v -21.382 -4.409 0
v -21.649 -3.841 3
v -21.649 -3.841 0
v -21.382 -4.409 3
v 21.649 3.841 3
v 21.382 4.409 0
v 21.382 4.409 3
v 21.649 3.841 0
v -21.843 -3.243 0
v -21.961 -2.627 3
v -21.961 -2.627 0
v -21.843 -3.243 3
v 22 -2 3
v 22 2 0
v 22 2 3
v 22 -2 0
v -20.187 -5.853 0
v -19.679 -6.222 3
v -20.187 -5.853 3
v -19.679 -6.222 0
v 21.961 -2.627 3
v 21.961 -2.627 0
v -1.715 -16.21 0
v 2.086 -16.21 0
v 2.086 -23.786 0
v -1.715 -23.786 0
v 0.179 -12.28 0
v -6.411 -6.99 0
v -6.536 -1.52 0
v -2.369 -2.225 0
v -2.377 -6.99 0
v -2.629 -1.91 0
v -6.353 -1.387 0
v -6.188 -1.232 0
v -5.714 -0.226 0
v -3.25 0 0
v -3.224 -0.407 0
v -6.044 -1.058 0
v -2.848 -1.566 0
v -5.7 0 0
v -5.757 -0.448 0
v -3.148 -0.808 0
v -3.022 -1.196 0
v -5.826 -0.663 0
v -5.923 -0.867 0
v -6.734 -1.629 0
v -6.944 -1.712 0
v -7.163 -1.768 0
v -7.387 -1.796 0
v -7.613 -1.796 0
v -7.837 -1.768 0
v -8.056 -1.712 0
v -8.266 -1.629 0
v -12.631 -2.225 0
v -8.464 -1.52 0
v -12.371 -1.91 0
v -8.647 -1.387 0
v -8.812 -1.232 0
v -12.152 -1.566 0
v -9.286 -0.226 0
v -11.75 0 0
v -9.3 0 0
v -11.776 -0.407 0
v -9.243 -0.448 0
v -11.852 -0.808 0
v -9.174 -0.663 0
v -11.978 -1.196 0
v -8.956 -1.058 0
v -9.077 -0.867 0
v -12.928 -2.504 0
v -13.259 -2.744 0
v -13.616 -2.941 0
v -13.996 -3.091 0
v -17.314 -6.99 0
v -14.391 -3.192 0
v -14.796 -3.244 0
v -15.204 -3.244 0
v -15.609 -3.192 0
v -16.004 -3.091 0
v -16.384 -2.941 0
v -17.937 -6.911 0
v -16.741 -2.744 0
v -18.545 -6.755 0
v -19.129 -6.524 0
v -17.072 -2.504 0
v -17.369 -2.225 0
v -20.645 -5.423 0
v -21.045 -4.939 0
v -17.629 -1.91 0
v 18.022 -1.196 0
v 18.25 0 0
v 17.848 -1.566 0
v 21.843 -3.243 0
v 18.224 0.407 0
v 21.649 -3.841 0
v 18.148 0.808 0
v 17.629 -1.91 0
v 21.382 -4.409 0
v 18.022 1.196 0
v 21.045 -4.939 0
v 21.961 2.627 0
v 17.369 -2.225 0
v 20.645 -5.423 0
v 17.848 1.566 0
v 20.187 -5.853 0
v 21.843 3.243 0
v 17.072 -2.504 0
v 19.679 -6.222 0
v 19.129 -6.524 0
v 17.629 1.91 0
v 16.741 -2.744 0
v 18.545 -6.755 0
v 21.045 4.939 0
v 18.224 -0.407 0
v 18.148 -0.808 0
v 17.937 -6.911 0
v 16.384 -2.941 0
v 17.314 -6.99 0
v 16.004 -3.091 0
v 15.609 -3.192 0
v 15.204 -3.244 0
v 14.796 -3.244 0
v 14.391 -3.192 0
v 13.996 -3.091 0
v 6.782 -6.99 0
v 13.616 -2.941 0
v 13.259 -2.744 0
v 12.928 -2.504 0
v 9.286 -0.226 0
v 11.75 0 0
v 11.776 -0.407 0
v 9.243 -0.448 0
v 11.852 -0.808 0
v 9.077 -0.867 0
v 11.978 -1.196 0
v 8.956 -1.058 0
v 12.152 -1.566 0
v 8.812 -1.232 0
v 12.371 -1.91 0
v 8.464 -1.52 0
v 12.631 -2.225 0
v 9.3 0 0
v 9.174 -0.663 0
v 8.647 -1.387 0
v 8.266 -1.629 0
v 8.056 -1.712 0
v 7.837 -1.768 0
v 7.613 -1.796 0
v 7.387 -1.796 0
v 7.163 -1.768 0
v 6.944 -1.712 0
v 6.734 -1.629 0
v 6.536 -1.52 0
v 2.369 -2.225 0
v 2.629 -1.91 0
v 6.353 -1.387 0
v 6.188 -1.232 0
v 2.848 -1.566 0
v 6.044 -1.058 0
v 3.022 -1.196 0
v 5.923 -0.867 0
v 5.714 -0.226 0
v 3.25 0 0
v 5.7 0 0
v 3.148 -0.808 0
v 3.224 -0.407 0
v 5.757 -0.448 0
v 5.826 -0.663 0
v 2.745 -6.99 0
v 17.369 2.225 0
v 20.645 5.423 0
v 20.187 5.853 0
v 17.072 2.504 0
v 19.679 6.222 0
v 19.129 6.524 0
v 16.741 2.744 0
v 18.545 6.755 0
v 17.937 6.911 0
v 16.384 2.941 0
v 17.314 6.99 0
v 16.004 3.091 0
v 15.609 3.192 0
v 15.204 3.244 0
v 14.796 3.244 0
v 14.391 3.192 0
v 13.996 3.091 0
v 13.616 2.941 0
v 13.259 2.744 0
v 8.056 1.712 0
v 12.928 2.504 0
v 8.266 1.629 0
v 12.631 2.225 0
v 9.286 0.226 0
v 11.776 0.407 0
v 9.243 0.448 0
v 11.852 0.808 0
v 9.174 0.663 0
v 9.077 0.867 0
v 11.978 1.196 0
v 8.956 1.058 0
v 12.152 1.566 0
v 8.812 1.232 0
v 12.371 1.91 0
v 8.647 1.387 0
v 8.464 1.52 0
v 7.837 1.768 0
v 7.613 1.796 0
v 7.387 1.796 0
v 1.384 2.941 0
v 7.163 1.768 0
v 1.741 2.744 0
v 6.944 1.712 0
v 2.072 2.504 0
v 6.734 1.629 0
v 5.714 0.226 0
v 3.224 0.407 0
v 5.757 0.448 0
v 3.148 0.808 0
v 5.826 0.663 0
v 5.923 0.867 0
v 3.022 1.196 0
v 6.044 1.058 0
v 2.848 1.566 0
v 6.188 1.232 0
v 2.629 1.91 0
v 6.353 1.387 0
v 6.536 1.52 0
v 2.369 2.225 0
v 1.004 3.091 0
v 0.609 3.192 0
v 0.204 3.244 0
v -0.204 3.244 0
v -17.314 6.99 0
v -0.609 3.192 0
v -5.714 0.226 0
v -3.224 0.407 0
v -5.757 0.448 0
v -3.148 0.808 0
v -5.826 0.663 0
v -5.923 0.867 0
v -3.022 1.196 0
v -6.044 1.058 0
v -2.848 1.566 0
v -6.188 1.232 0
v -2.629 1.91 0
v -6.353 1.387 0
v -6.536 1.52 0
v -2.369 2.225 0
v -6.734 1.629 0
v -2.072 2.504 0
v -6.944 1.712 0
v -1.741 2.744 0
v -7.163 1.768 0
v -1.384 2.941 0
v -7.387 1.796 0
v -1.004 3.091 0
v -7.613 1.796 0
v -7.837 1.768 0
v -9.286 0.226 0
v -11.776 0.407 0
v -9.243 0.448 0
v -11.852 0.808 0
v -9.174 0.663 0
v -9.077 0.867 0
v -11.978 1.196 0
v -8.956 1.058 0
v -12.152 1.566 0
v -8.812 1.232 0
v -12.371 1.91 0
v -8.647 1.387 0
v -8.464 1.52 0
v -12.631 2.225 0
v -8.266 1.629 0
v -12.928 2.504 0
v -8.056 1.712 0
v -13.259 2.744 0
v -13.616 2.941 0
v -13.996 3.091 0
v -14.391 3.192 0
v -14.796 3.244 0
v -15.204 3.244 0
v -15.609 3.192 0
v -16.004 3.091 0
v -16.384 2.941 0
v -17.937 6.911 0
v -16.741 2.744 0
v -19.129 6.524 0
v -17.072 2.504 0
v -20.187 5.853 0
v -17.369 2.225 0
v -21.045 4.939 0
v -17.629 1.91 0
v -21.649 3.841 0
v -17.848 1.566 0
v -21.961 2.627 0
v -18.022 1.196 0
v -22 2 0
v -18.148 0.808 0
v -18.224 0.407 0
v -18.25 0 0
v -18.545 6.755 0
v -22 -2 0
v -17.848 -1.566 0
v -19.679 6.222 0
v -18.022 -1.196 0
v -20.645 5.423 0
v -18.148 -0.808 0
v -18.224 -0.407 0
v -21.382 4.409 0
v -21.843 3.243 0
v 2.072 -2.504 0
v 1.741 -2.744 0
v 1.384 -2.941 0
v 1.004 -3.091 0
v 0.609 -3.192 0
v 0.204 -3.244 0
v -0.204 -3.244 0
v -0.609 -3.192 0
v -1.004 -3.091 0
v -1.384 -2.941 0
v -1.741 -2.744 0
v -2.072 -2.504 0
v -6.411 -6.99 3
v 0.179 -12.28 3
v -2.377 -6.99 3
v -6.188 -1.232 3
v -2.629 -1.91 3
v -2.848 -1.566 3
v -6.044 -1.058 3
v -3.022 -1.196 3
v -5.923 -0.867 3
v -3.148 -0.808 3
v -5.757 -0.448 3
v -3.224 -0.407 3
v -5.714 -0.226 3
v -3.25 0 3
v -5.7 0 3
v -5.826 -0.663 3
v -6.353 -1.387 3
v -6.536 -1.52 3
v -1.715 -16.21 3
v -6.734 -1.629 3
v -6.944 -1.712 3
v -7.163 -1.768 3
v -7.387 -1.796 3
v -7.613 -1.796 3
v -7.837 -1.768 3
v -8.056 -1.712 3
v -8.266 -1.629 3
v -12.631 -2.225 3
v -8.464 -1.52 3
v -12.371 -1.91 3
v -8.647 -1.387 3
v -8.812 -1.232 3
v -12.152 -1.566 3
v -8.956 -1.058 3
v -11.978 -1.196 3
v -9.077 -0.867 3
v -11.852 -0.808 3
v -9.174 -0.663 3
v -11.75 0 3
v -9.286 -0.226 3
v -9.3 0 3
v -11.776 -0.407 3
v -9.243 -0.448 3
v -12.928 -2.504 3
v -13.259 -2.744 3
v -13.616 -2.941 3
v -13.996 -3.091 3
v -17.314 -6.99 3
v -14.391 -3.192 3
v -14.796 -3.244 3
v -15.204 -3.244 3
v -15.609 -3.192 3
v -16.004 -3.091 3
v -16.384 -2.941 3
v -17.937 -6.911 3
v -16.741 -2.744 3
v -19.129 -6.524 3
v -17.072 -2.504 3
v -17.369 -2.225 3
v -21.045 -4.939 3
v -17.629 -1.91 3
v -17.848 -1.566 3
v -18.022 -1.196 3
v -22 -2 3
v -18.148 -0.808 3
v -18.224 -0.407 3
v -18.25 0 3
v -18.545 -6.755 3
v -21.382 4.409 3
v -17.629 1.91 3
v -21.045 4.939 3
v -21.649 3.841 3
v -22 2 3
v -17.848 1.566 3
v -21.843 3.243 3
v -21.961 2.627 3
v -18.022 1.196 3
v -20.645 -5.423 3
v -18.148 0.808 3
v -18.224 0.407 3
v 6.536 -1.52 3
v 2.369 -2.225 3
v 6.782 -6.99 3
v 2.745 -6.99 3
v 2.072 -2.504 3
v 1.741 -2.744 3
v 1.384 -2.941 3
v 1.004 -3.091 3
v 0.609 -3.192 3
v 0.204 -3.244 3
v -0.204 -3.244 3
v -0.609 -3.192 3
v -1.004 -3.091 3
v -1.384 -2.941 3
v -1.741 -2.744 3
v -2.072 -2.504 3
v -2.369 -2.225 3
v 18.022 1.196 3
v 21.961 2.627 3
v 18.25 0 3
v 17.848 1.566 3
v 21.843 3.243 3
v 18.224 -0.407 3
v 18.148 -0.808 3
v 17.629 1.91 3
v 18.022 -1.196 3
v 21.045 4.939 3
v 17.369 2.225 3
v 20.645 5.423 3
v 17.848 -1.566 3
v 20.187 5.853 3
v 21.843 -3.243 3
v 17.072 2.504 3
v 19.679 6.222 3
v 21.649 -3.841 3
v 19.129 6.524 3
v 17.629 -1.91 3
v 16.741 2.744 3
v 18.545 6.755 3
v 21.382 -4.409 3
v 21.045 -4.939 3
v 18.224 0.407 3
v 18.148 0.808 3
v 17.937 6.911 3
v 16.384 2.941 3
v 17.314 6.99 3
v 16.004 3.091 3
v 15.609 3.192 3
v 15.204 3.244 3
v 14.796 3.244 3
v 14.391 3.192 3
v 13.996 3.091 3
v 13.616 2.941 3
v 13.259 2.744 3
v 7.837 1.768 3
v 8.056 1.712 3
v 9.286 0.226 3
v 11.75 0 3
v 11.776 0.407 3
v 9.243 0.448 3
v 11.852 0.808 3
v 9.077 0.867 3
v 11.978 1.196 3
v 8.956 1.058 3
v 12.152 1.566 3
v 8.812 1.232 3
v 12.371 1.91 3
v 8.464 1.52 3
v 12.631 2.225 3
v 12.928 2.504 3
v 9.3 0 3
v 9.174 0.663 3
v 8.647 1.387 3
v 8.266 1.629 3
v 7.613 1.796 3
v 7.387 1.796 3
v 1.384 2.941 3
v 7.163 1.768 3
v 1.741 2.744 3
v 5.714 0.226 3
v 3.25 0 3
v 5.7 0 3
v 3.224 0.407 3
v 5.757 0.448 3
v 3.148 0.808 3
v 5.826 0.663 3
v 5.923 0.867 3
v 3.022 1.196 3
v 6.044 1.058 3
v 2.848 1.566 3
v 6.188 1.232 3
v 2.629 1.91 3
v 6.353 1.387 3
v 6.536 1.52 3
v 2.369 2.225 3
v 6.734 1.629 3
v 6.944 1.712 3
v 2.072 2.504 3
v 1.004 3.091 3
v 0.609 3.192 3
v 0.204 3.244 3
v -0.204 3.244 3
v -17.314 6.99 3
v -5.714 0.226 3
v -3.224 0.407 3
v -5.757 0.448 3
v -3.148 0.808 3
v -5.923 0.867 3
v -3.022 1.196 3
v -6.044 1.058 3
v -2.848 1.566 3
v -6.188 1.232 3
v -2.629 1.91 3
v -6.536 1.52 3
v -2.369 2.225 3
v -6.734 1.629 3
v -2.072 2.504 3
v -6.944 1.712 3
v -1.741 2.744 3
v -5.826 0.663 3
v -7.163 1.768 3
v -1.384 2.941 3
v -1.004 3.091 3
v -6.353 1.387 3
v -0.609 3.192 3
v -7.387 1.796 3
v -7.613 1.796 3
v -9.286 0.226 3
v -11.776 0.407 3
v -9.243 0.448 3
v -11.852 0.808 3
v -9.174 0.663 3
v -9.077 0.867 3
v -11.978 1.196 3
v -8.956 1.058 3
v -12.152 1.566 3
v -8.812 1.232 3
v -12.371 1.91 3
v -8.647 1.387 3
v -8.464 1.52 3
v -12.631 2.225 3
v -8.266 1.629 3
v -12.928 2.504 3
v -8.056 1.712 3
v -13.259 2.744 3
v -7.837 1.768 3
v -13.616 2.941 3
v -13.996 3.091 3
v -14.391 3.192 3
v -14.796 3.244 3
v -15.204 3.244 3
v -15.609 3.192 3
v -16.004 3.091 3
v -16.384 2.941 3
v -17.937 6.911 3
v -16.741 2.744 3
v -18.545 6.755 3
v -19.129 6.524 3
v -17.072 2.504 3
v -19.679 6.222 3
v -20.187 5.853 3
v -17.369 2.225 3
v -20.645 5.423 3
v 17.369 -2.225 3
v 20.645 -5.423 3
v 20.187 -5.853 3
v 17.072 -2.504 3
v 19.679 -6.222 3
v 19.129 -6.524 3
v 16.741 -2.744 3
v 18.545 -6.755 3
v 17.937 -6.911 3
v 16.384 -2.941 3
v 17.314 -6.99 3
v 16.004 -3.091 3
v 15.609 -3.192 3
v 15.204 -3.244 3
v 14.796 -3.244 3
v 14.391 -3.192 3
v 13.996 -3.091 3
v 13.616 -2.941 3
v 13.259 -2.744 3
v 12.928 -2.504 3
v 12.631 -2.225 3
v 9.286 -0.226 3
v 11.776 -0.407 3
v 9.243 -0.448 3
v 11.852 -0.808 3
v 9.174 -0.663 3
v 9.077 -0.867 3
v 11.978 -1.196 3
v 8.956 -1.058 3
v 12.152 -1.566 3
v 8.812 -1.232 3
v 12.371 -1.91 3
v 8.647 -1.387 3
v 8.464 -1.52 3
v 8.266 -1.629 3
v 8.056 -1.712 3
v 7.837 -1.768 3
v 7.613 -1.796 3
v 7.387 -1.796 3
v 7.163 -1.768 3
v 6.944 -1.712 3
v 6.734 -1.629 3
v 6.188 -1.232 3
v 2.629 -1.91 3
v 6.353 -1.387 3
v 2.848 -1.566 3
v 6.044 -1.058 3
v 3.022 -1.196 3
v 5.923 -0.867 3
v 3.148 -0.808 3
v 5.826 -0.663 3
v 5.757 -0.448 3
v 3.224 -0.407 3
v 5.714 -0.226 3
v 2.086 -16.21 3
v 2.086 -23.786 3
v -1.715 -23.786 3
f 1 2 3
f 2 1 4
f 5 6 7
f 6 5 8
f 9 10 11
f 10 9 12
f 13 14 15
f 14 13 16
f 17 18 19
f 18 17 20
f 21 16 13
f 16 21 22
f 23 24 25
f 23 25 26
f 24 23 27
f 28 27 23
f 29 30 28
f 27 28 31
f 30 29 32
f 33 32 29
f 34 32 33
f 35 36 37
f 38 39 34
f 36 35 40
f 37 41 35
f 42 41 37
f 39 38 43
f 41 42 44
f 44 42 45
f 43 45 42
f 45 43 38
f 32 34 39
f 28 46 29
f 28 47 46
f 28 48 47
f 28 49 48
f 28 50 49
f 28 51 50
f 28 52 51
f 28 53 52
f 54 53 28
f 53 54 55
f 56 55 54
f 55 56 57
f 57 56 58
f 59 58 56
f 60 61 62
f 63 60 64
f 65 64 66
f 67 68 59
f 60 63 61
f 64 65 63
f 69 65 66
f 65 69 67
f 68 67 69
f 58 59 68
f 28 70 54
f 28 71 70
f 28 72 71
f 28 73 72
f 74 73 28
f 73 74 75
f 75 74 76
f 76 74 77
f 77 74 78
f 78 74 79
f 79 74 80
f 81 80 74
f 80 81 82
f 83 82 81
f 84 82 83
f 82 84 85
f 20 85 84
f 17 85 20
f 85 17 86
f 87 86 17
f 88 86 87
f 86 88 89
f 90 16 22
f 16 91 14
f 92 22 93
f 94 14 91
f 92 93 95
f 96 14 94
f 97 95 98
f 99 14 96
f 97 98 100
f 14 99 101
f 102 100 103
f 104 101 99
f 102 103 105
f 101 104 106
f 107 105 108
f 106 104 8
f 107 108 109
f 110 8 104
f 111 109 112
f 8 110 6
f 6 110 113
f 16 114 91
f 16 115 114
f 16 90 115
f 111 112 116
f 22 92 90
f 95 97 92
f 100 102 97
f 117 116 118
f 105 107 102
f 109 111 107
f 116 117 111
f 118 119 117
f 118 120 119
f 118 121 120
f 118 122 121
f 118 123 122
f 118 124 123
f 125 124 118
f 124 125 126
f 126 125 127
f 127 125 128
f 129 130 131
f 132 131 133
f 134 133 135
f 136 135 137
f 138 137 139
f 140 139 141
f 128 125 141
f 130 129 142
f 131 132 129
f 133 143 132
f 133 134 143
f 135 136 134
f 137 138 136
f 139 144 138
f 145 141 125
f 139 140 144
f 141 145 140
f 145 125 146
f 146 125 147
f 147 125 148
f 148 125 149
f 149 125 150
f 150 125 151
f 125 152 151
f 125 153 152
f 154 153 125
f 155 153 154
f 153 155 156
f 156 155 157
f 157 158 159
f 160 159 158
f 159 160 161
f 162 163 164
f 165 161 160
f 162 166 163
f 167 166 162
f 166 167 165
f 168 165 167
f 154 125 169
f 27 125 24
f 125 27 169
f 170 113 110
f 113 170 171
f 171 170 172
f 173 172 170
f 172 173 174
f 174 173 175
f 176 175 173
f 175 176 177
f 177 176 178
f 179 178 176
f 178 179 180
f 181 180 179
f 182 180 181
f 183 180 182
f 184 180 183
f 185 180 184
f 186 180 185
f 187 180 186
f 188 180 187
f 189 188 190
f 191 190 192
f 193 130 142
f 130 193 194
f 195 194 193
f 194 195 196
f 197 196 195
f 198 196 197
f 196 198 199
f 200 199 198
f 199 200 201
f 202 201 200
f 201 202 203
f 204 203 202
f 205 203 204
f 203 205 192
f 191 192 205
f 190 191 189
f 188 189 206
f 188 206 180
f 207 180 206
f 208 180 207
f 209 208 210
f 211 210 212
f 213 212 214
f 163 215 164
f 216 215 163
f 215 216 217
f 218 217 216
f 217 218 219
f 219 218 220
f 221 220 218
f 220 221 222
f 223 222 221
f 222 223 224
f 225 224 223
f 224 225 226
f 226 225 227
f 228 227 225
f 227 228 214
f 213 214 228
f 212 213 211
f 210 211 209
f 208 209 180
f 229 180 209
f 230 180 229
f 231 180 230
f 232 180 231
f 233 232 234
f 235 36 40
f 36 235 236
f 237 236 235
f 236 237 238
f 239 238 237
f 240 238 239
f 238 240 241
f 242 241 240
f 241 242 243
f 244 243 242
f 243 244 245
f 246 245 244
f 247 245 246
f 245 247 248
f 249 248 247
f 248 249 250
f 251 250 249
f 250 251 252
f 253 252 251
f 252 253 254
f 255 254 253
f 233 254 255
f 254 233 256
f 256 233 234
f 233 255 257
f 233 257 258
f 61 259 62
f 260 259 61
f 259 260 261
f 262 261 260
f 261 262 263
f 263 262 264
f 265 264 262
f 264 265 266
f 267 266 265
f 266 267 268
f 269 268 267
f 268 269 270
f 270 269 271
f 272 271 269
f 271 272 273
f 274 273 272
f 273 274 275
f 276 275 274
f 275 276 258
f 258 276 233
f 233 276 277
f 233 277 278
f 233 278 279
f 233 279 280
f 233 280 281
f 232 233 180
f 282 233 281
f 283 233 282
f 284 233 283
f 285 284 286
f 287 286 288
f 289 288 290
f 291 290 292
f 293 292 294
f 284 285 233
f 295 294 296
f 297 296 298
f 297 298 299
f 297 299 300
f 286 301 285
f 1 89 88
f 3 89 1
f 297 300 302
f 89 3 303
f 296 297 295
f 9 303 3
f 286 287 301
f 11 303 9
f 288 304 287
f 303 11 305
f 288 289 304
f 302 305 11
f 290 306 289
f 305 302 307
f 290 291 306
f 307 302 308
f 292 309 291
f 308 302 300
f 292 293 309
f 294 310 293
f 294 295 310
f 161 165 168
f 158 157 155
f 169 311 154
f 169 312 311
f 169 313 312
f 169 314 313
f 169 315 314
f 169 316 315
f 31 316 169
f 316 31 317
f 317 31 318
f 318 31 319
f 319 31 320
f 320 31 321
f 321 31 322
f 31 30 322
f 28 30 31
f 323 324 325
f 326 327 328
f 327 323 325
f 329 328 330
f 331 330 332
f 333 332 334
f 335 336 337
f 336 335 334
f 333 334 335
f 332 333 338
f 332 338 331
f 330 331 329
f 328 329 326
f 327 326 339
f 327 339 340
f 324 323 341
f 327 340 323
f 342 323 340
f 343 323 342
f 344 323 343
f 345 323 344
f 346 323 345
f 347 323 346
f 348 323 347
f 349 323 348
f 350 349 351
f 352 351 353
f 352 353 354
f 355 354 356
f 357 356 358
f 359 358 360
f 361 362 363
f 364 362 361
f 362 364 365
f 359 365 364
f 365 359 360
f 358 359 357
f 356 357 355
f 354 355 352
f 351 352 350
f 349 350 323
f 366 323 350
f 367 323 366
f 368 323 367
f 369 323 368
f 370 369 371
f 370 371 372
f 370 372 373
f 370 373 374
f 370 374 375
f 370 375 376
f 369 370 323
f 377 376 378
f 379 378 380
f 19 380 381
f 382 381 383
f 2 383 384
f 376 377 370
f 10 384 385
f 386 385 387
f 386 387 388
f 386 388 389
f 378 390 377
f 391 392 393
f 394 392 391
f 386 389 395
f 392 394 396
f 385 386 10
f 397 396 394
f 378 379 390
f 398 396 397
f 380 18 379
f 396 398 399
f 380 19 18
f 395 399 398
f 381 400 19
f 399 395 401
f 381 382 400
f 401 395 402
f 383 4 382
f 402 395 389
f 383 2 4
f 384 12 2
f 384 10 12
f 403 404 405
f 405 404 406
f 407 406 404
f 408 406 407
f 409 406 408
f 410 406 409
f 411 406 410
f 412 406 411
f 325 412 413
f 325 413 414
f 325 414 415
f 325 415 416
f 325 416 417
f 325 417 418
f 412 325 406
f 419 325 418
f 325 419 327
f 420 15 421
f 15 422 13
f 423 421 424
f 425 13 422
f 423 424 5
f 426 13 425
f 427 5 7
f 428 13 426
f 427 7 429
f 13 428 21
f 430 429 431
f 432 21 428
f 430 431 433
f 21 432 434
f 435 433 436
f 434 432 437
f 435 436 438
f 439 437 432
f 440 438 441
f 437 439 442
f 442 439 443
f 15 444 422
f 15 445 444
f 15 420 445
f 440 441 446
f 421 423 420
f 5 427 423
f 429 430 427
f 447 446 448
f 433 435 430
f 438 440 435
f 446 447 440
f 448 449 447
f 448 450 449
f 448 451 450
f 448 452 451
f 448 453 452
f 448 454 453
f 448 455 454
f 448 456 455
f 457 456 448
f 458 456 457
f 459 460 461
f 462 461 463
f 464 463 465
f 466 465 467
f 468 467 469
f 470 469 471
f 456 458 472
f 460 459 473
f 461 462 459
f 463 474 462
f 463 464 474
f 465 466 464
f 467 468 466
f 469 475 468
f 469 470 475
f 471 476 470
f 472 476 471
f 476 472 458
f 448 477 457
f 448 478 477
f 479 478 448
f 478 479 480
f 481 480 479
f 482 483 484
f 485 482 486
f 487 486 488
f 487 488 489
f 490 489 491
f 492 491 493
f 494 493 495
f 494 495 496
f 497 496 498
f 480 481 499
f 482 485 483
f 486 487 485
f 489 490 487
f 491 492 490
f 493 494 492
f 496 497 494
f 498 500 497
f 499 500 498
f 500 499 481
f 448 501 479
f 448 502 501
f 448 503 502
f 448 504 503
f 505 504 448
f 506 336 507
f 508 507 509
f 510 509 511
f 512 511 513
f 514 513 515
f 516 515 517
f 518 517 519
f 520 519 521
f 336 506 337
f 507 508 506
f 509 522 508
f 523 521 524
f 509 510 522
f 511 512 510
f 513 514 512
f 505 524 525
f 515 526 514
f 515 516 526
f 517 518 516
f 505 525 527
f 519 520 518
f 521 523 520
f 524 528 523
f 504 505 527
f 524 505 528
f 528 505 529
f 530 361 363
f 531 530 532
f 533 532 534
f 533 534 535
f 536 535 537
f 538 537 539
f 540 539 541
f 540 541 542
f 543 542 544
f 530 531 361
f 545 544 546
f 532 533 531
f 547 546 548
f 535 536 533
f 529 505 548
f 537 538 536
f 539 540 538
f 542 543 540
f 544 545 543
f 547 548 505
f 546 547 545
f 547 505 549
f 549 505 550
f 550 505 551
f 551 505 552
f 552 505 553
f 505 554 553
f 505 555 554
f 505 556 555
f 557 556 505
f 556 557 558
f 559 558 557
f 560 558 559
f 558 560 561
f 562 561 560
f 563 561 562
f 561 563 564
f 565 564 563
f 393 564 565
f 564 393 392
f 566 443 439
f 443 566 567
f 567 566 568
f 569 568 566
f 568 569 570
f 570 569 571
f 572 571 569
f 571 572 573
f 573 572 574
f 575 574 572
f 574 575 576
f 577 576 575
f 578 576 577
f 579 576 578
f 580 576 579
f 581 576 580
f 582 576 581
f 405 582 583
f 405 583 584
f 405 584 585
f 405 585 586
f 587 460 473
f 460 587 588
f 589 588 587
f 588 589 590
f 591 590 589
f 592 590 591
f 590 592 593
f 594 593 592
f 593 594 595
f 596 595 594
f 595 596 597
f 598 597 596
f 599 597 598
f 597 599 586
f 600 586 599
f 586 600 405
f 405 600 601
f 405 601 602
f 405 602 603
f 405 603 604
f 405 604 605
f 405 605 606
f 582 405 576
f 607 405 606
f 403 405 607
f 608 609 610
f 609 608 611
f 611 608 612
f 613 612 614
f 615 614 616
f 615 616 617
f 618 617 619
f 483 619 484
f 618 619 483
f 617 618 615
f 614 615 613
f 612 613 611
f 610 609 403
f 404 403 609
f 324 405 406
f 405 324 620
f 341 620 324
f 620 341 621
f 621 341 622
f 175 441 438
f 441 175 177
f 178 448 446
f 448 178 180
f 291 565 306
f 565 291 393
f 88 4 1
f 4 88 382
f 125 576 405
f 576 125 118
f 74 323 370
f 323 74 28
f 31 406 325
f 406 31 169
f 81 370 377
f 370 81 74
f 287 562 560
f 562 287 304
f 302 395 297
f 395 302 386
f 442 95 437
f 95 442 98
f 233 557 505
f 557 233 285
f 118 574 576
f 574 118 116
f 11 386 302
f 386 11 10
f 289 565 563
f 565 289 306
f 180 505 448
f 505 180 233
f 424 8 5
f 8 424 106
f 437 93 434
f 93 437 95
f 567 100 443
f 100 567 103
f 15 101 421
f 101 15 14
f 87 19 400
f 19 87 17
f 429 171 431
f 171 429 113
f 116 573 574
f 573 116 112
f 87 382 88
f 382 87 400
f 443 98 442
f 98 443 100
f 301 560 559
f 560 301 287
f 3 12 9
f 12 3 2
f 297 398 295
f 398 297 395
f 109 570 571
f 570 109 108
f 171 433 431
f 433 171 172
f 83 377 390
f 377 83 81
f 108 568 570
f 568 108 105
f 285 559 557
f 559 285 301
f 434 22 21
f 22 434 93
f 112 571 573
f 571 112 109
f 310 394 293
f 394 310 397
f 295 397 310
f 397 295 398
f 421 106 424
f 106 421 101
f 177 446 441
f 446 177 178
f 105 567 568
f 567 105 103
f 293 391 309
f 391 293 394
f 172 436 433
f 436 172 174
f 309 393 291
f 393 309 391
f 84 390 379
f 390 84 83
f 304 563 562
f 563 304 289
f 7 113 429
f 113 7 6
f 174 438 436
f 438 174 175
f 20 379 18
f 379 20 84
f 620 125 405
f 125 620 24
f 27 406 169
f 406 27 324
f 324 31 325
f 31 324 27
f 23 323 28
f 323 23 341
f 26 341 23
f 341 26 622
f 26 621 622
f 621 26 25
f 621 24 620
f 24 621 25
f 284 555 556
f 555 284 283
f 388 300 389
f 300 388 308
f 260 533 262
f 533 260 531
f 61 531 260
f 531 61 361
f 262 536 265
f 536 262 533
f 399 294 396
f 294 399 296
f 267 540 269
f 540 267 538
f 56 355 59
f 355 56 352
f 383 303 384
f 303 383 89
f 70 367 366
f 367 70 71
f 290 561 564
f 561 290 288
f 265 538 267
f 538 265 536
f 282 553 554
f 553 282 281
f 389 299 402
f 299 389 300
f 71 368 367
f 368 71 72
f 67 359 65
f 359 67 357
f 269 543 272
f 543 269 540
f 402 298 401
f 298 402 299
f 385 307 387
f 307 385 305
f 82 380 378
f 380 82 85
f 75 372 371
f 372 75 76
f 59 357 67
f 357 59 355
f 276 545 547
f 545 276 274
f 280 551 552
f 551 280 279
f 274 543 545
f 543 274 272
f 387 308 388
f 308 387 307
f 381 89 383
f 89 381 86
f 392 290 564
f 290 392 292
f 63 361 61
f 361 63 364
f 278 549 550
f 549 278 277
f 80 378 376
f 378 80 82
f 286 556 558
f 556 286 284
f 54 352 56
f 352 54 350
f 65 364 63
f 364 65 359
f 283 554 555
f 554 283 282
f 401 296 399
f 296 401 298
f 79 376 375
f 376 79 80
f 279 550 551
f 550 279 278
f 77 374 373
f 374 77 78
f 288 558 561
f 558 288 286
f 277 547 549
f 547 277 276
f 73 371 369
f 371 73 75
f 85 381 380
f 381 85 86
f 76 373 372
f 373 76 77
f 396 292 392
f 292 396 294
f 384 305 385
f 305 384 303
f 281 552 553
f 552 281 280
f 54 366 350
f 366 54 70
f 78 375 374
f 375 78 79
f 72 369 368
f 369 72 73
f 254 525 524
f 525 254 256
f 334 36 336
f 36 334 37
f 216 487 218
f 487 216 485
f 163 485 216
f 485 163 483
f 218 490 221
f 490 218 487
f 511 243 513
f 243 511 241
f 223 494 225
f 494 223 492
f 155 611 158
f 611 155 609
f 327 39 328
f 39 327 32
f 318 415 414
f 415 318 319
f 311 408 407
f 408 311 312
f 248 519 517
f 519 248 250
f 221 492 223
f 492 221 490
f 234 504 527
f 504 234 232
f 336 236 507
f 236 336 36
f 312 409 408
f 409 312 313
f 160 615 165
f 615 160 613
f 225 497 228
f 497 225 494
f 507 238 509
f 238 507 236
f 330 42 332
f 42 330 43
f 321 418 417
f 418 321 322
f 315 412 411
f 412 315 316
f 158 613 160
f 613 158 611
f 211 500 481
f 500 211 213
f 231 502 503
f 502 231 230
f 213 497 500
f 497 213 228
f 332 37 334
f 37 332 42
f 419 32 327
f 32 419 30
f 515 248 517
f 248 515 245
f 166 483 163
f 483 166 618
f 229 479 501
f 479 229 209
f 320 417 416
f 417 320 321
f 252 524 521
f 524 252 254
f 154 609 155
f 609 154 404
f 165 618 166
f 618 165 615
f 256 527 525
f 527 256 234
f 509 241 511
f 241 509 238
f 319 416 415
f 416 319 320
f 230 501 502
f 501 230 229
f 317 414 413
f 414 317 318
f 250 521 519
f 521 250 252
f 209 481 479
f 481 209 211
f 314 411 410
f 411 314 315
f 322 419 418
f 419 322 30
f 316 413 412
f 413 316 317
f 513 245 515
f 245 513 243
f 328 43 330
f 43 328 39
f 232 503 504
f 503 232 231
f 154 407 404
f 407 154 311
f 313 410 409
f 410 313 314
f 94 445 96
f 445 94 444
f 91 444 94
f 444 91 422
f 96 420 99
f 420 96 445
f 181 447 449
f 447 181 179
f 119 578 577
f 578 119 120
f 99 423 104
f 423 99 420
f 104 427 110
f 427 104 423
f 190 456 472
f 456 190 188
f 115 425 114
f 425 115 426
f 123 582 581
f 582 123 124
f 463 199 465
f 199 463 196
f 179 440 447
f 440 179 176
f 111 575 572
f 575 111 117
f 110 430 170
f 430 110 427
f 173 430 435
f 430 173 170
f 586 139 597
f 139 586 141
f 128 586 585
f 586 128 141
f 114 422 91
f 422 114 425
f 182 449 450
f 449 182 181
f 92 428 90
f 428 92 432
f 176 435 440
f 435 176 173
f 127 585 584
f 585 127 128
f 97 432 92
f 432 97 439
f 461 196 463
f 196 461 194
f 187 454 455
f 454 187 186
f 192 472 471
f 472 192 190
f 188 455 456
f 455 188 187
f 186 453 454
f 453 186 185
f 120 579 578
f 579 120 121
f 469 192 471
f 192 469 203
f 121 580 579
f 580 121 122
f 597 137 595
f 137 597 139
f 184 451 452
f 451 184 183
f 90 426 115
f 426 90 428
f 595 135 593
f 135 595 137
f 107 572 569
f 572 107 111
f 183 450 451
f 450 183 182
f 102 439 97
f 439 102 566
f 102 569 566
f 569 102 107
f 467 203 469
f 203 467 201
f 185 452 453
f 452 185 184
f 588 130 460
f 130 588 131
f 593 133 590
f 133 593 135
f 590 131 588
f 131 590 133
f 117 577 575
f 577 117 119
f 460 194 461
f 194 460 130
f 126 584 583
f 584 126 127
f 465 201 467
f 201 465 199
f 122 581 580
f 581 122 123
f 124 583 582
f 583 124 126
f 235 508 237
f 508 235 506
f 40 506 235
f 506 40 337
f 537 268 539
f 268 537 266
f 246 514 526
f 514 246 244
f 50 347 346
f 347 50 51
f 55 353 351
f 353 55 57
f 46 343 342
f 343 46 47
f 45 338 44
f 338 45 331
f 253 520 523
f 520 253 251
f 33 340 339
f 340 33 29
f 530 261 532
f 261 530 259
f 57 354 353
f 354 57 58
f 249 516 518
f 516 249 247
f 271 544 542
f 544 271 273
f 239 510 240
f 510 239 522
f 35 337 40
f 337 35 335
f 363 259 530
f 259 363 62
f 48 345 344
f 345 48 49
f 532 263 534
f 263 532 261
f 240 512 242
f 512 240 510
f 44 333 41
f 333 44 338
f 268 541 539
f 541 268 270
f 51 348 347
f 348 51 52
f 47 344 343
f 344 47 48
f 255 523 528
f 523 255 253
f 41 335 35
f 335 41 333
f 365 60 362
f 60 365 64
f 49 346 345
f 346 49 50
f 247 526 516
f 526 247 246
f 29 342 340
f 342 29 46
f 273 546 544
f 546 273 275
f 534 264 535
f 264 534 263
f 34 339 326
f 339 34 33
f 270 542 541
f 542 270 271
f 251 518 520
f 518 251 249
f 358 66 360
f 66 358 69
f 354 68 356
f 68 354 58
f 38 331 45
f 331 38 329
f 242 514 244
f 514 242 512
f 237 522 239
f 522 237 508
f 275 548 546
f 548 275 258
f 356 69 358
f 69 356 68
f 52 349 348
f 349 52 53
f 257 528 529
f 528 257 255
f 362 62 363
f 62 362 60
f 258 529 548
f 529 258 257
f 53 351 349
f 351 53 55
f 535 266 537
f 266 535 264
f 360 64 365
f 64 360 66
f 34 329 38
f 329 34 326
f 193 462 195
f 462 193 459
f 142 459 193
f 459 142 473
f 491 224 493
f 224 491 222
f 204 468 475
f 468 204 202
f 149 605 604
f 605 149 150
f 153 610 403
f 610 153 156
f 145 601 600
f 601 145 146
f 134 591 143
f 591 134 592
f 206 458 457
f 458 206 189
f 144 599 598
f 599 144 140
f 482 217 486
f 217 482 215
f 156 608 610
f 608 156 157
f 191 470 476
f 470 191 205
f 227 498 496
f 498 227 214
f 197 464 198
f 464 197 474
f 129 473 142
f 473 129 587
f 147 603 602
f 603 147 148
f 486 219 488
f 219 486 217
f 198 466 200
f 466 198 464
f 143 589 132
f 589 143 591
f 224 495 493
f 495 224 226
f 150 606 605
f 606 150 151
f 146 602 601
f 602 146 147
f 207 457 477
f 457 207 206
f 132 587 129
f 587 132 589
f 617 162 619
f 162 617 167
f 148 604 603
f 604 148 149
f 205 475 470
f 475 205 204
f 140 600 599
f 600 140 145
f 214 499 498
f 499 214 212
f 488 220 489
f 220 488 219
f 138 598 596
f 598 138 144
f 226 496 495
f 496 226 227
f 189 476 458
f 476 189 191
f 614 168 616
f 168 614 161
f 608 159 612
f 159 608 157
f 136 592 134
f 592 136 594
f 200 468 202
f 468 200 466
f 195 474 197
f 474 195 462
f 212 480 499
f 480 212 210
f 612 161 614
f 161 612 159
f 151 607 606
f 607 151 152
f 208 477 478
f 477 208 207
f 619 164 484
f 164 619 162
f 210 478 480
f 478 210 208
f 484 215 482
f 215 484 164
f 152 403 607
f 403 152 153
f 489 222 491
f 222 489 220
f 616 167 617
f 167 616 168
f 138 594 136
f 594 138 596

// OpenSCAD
$fn = 50;


difference() {
	union() {
		hull() {
			translate(v = [-17.0000000000, 2.0000000000, 0]) {
				cylinder(h = 3, r = 5);
			}
			translate(v = [17.0000000000, 2.0000000000, 0]) {
				cylinder(h = 3, r = 5);
			}
			translate(v = [-17.0000000000, -2.0000000000, 0]) {
				cylinder(h = 3, r = 5);
			}
			translate(v = [17.0000000000, -2.0000000000, 0]) {
				cylinder(h = 3, r = 5);
			}
		}
		translate(v = [0, -5, 0]) {
			linear_extrude(height = 3) {
				text(font = "DejaVu Sans Mono:style=Bold", halign = "center", size = 19.0000000000, text = "Y", valign = "top");
			}
		}
	}
	union() {
		translate(v = [-15.0000000000, 0.0000000000, 0]) {
			translate(v = [0, 0, -100]) {
				cylinder(h = 200, r = 3.2500000000);
			}
		}
		translate(v = [0, 0, -100]) {
			cylinder(h = 200, r = 3.2500000000);
		}
		translate(v = [15.0000000000, 0.0000000000, 0]) {
			translate(v = [0, 0, -100]) {
				cylinder(h = 200, r = 3.2500000000);
			}
		}
		translate(v = [-15.0000000000, 0.0000000000, 0]) {
			translate(v = [0, 0, -100]) {
				cylinder(h = 200, r = 1.8000000000);
			}
		}
		translate(v = [-7.5000000000, 0.0000000000, 0]) {
			translate(v = [0, 0, -100]) {
				cylinder(h = 200, r = 1.8000000000);
			}
		}
		translate(v = [0, 0, -100]) {
			cylinder(h = 200, r = 1.8000000000);
		}
		translate(v = [7.5000000000, 0.0000000000, 0]) {
			translate(v = [0, 0, -100]) {
				cylinder(h = 200, r = 1.8000000000);
			}
		}
		translate(v = [15.0000000000, 0.0000000000, 0]) {
			translate(v = [0, 0, -100]) {
				cylinder(h = 200, r = 1.8000000000);
			}
		}
	}
}
